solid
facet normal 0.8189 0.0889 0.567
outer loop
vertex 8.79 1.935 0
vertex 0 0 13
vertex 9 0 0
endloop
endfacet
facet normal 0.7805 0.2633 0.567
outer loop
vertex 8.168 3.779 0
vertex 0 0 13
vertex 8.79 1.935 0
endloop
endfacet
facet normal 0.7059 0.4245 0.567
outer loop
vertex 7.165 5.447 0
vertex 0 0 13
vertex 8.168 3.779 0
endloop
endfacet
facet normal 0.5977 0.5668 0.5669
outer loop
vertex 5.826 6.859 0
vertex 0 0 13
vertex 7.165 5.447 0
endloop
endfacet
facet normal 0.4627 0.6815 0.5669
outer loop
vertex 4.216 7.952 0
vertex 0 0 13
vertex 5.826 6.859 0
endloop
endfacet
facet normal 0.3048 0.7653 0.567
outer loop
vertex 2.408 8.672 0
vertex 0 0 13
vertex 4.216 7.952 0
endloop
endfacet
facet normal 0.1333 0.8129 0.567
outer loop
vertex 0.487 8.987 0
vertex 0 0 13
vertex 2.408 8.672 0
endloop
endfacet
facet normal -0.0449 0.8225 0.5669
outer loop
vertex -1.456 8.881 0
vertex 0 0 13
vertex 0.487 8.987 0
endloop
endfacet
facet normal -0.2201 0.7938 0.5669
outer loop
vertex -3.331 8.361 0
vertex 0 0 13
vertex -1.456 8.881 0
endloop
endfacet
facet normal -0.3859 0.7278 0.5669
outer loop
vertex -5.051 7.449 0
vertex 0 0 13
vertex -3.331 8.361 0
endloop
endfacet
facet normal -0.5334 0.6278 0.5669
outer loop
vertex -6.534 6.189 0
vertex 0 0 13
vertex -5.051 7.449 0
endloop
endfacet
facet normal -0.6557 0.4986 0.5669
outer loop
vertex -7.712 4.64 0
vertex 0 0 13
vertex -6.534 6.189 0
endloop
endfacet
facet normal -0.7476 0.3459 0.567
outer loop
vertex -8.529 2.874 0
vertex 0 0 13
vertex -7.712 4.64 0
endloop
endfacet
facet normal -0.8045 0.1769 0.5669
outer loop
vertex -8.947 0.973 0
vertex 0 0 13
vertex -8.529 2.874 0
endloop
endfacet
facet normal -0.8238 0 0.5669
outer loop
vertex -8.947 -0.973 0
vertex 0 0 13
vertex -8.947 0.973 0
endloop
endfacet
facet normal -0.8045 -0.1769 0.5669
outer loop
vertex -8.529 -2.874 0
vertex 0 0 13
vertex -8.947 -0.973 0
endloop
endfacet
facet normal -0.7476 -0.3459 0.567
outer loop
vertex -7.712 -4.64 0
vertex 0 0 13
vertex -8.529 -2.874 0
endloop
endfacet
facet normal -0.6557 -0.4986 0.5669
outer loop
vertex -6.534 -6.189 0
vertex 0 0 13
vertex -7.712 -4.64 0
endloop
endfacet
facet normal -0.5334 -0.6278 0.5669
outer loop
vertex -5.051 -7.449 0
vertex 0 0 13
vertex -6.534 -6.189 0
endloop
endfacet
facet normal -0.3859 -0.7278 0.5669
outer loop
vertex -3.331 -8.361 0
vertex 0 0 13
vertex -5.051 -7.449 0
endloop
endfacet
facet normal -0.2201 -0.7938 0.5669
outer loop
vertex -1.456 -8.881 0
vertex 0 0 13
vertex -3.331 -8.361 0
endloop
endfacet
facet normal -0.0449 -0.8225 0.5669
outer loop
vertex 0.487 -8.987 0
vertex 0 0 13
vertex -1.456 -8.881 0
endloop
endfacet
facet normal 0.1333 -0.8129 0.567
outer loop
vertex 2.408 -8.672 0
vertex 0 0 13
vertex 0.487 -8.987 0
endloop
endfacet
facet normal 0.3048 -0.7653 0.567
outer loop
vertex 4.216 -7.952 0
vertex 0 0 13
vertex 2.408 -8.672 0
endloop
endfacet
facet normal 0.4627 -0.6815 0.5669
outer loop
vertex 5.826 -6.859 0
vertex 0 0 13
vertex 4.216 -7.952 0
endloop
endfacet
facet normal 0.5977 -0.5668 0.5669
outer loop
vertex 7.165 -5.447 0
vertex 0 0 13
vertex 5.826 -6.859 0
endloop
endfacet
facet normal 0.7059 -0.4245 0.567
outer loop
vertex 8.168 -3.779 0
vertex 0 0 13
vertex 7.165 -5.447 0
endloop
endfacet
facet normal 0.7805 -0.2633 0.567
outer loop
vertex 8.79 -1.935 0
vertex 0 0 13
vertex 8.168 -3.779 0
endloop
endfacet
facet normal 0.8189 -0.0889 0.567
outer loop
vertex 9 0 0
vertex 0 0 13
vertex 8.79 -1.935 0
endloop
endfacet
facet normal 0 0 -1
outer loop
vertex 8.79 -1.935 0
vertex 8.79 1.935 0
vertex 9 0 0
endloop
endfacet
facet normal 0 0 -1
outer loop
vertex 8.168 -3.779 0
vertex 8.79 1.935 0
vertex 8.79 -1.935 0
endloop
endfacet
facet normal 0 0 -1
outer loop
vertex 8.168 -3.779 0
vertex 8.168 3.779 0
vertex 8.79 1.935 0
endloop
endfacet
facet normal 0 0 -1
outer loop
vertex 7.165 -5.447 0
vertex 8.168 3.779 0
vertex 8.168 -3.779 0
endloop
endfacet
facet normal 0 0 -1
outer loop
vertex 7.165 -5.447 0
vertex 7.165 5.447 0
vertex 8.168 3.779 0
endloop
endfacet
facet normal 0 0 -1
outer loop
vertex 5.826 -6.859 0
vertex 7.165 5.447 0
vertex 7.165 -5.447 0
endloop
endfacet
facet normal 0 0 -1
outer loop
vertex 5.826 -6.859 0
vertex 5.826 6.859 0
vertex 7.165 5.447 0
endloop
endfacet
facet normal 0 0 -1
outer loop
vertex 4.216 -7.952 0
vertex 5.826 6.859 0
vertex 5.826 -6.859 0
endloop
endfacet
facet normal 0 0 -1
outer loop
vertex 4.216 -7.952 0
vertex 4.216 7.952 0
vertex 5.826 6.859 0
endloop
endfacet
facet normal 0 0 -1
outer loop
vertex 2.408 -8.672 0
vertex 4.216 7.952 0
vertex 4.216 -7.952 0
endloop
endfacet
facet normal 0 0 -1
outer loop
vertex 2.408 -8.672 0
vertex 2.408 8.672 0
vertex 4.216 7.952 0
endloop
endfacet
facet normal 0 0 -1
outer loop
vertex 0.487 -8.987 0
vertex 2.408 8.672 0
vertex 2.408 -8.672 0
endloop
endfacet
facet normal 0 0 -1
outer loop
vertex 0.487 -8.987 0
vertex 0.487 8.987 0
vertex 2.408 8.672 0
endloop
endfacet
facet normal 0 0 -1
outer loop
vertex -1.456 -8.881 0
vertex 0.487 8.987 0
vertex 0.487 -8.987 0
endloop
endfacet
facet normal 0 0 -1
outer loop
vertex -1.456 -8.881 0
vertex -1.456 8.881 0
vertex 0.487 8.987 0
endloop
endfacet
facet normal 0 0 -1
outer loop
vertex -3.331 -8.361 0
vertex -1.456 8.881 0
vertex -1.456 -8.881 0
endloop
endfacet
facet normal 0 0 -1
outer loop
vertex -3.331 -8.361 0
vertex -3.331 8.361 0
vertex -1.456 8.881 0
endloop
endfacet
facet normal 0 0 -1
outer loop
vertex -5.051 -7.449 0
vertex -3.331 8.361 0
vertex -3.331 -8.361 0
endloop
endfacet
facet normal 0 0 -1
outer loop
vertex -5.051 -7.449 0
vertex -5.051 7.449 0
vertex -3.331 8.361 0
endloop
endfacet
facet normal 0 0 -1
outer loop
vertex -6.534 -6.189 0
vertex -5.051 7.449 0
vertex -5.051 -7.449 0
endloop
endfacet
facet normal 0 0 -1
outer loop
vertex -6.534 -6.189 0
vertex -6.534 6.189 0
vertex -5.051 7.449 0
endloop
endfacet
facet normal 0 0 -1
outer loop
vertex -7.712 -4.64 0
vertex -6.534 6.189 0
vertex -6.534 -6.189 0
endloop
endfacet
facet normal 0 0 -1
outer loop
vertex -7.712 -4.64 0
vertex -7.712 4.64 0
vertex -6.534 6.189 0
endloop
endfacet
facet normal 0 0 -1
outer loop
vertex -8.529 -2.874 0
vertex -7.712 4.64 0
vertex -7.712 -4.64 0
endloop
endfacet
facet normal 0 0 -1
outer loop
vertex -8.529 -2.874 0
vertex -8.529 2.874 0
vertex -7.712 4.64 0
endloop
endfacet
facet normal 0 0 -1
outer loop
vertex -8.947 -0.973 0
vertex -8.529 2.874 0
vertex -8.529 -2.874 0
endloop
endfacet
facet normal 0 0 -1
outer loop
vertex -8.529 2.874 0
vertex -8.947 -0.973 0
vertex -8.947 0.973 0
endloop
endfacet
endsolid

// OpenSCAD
// Generated by SolidPython 1.0.1 on 2020-07-29 00:46:43


cylinder(h = 13, r1 = 9, r2 = 0);
/***********************************************
*********      SolidPython code:      **********
************************************************
 
# import packages: SolidPython
from solid import *
from solid.utils import *
from itertools import chain, combinations, permutations


class Resize:

    def __init__(self, scad_file):
        self.scad_file = scad_file
        #self.scad_file = import_scad(scad_file)
        # cone/cylinder param:
        self.r1 = 0
        self.r2 = 0
        self.h = 0
        # rectangular prism param:
        self.w = 0
        self.l = 0
        # ellipse param:
        self.r = 0

    # import OpenScad code (file name corresponds to shape)


    # classify shape + parameters
    def assign(self, param1, param2, param3):
        if self.scad_file == 'cone.scad':
            self.r1 = param1
            self.r2 = param2
            self.h = param3
        elif self.scad_file == 'cylinder.scad':
            self.r1 = param1
            self.r2 = param2
            self.h = param3
        elif self.scad_file == 'rectangularPrism.scad':
            self.h = param1
            self.l = param2
            self.w = param3
        else:
            self.r = param1
            self.h = param2

    # resize parameters
    def iterate(self):
        x = range(3, 20, 2)
        i = 1
        if self.scad_file == 'cone.scad':
            tempList = list(permutations(x, 2))
            for temp in tempList:
                param1 = temp[0]
                param2 = temp[1]
                filepath = 'produced_scad_files/' + 'cone' + str(param1) + '_' + str(param2) + '_' + '.scad'
                scad_render_to_file(cylinder(h=param1, r1=param2, r2=0), filepath)

        elif self.scad_file == 'cylinder.scad':
            tempList = list(permutations(x, 3))
            for temp in tempList:
                param1 = temp[0]
                param2 = temp[1]
                filepath = 'produced_scad_files/' + 'cylinder' + str(param1) + '_' + str(param2) + '_' + '.scad'
                scad_render_to_file(cylinder(h=param1, r1=param2, r2=param2), filepath)

        elif self.scad_file == 'rectangularPrism.scad':
            tempList = list(permutations(x, 3))
            for temp in tempList:
                param1 = temp[0]
                param2 = temp[1]
                param3 = temp[2]
                filepath = 'produced_scad_files/' + 'rectangularPrism' + str(param1) + '_' + str(param2) + '_' + str(
                    param3) + '.scad'
                scad_render_to_file(cube(size=(param1, param2, param3)), filepath)

        elif self.scad_file == 'ellipse.scad':
            tempList = list(permutations(x, 4))
            for temp in tempList:
                param1 = temp[0]
                param2 = temp[1]
                param3 = temp[2]
                param4 = temp[3]
                filepath = 'produced_scad_files/' + 'ellipse' + str(param1) + '_' + str(param2) + '_' + str(param3) + '_' + str(param4) + '.scad'
                scad_render_to_file(scale([param1, param2, param3])(sphere(r=param4)), filepath)

    def render_to_scadfile(self):
        scad_render_to_file(scad, 'example.scad') 
 
************************************************/
